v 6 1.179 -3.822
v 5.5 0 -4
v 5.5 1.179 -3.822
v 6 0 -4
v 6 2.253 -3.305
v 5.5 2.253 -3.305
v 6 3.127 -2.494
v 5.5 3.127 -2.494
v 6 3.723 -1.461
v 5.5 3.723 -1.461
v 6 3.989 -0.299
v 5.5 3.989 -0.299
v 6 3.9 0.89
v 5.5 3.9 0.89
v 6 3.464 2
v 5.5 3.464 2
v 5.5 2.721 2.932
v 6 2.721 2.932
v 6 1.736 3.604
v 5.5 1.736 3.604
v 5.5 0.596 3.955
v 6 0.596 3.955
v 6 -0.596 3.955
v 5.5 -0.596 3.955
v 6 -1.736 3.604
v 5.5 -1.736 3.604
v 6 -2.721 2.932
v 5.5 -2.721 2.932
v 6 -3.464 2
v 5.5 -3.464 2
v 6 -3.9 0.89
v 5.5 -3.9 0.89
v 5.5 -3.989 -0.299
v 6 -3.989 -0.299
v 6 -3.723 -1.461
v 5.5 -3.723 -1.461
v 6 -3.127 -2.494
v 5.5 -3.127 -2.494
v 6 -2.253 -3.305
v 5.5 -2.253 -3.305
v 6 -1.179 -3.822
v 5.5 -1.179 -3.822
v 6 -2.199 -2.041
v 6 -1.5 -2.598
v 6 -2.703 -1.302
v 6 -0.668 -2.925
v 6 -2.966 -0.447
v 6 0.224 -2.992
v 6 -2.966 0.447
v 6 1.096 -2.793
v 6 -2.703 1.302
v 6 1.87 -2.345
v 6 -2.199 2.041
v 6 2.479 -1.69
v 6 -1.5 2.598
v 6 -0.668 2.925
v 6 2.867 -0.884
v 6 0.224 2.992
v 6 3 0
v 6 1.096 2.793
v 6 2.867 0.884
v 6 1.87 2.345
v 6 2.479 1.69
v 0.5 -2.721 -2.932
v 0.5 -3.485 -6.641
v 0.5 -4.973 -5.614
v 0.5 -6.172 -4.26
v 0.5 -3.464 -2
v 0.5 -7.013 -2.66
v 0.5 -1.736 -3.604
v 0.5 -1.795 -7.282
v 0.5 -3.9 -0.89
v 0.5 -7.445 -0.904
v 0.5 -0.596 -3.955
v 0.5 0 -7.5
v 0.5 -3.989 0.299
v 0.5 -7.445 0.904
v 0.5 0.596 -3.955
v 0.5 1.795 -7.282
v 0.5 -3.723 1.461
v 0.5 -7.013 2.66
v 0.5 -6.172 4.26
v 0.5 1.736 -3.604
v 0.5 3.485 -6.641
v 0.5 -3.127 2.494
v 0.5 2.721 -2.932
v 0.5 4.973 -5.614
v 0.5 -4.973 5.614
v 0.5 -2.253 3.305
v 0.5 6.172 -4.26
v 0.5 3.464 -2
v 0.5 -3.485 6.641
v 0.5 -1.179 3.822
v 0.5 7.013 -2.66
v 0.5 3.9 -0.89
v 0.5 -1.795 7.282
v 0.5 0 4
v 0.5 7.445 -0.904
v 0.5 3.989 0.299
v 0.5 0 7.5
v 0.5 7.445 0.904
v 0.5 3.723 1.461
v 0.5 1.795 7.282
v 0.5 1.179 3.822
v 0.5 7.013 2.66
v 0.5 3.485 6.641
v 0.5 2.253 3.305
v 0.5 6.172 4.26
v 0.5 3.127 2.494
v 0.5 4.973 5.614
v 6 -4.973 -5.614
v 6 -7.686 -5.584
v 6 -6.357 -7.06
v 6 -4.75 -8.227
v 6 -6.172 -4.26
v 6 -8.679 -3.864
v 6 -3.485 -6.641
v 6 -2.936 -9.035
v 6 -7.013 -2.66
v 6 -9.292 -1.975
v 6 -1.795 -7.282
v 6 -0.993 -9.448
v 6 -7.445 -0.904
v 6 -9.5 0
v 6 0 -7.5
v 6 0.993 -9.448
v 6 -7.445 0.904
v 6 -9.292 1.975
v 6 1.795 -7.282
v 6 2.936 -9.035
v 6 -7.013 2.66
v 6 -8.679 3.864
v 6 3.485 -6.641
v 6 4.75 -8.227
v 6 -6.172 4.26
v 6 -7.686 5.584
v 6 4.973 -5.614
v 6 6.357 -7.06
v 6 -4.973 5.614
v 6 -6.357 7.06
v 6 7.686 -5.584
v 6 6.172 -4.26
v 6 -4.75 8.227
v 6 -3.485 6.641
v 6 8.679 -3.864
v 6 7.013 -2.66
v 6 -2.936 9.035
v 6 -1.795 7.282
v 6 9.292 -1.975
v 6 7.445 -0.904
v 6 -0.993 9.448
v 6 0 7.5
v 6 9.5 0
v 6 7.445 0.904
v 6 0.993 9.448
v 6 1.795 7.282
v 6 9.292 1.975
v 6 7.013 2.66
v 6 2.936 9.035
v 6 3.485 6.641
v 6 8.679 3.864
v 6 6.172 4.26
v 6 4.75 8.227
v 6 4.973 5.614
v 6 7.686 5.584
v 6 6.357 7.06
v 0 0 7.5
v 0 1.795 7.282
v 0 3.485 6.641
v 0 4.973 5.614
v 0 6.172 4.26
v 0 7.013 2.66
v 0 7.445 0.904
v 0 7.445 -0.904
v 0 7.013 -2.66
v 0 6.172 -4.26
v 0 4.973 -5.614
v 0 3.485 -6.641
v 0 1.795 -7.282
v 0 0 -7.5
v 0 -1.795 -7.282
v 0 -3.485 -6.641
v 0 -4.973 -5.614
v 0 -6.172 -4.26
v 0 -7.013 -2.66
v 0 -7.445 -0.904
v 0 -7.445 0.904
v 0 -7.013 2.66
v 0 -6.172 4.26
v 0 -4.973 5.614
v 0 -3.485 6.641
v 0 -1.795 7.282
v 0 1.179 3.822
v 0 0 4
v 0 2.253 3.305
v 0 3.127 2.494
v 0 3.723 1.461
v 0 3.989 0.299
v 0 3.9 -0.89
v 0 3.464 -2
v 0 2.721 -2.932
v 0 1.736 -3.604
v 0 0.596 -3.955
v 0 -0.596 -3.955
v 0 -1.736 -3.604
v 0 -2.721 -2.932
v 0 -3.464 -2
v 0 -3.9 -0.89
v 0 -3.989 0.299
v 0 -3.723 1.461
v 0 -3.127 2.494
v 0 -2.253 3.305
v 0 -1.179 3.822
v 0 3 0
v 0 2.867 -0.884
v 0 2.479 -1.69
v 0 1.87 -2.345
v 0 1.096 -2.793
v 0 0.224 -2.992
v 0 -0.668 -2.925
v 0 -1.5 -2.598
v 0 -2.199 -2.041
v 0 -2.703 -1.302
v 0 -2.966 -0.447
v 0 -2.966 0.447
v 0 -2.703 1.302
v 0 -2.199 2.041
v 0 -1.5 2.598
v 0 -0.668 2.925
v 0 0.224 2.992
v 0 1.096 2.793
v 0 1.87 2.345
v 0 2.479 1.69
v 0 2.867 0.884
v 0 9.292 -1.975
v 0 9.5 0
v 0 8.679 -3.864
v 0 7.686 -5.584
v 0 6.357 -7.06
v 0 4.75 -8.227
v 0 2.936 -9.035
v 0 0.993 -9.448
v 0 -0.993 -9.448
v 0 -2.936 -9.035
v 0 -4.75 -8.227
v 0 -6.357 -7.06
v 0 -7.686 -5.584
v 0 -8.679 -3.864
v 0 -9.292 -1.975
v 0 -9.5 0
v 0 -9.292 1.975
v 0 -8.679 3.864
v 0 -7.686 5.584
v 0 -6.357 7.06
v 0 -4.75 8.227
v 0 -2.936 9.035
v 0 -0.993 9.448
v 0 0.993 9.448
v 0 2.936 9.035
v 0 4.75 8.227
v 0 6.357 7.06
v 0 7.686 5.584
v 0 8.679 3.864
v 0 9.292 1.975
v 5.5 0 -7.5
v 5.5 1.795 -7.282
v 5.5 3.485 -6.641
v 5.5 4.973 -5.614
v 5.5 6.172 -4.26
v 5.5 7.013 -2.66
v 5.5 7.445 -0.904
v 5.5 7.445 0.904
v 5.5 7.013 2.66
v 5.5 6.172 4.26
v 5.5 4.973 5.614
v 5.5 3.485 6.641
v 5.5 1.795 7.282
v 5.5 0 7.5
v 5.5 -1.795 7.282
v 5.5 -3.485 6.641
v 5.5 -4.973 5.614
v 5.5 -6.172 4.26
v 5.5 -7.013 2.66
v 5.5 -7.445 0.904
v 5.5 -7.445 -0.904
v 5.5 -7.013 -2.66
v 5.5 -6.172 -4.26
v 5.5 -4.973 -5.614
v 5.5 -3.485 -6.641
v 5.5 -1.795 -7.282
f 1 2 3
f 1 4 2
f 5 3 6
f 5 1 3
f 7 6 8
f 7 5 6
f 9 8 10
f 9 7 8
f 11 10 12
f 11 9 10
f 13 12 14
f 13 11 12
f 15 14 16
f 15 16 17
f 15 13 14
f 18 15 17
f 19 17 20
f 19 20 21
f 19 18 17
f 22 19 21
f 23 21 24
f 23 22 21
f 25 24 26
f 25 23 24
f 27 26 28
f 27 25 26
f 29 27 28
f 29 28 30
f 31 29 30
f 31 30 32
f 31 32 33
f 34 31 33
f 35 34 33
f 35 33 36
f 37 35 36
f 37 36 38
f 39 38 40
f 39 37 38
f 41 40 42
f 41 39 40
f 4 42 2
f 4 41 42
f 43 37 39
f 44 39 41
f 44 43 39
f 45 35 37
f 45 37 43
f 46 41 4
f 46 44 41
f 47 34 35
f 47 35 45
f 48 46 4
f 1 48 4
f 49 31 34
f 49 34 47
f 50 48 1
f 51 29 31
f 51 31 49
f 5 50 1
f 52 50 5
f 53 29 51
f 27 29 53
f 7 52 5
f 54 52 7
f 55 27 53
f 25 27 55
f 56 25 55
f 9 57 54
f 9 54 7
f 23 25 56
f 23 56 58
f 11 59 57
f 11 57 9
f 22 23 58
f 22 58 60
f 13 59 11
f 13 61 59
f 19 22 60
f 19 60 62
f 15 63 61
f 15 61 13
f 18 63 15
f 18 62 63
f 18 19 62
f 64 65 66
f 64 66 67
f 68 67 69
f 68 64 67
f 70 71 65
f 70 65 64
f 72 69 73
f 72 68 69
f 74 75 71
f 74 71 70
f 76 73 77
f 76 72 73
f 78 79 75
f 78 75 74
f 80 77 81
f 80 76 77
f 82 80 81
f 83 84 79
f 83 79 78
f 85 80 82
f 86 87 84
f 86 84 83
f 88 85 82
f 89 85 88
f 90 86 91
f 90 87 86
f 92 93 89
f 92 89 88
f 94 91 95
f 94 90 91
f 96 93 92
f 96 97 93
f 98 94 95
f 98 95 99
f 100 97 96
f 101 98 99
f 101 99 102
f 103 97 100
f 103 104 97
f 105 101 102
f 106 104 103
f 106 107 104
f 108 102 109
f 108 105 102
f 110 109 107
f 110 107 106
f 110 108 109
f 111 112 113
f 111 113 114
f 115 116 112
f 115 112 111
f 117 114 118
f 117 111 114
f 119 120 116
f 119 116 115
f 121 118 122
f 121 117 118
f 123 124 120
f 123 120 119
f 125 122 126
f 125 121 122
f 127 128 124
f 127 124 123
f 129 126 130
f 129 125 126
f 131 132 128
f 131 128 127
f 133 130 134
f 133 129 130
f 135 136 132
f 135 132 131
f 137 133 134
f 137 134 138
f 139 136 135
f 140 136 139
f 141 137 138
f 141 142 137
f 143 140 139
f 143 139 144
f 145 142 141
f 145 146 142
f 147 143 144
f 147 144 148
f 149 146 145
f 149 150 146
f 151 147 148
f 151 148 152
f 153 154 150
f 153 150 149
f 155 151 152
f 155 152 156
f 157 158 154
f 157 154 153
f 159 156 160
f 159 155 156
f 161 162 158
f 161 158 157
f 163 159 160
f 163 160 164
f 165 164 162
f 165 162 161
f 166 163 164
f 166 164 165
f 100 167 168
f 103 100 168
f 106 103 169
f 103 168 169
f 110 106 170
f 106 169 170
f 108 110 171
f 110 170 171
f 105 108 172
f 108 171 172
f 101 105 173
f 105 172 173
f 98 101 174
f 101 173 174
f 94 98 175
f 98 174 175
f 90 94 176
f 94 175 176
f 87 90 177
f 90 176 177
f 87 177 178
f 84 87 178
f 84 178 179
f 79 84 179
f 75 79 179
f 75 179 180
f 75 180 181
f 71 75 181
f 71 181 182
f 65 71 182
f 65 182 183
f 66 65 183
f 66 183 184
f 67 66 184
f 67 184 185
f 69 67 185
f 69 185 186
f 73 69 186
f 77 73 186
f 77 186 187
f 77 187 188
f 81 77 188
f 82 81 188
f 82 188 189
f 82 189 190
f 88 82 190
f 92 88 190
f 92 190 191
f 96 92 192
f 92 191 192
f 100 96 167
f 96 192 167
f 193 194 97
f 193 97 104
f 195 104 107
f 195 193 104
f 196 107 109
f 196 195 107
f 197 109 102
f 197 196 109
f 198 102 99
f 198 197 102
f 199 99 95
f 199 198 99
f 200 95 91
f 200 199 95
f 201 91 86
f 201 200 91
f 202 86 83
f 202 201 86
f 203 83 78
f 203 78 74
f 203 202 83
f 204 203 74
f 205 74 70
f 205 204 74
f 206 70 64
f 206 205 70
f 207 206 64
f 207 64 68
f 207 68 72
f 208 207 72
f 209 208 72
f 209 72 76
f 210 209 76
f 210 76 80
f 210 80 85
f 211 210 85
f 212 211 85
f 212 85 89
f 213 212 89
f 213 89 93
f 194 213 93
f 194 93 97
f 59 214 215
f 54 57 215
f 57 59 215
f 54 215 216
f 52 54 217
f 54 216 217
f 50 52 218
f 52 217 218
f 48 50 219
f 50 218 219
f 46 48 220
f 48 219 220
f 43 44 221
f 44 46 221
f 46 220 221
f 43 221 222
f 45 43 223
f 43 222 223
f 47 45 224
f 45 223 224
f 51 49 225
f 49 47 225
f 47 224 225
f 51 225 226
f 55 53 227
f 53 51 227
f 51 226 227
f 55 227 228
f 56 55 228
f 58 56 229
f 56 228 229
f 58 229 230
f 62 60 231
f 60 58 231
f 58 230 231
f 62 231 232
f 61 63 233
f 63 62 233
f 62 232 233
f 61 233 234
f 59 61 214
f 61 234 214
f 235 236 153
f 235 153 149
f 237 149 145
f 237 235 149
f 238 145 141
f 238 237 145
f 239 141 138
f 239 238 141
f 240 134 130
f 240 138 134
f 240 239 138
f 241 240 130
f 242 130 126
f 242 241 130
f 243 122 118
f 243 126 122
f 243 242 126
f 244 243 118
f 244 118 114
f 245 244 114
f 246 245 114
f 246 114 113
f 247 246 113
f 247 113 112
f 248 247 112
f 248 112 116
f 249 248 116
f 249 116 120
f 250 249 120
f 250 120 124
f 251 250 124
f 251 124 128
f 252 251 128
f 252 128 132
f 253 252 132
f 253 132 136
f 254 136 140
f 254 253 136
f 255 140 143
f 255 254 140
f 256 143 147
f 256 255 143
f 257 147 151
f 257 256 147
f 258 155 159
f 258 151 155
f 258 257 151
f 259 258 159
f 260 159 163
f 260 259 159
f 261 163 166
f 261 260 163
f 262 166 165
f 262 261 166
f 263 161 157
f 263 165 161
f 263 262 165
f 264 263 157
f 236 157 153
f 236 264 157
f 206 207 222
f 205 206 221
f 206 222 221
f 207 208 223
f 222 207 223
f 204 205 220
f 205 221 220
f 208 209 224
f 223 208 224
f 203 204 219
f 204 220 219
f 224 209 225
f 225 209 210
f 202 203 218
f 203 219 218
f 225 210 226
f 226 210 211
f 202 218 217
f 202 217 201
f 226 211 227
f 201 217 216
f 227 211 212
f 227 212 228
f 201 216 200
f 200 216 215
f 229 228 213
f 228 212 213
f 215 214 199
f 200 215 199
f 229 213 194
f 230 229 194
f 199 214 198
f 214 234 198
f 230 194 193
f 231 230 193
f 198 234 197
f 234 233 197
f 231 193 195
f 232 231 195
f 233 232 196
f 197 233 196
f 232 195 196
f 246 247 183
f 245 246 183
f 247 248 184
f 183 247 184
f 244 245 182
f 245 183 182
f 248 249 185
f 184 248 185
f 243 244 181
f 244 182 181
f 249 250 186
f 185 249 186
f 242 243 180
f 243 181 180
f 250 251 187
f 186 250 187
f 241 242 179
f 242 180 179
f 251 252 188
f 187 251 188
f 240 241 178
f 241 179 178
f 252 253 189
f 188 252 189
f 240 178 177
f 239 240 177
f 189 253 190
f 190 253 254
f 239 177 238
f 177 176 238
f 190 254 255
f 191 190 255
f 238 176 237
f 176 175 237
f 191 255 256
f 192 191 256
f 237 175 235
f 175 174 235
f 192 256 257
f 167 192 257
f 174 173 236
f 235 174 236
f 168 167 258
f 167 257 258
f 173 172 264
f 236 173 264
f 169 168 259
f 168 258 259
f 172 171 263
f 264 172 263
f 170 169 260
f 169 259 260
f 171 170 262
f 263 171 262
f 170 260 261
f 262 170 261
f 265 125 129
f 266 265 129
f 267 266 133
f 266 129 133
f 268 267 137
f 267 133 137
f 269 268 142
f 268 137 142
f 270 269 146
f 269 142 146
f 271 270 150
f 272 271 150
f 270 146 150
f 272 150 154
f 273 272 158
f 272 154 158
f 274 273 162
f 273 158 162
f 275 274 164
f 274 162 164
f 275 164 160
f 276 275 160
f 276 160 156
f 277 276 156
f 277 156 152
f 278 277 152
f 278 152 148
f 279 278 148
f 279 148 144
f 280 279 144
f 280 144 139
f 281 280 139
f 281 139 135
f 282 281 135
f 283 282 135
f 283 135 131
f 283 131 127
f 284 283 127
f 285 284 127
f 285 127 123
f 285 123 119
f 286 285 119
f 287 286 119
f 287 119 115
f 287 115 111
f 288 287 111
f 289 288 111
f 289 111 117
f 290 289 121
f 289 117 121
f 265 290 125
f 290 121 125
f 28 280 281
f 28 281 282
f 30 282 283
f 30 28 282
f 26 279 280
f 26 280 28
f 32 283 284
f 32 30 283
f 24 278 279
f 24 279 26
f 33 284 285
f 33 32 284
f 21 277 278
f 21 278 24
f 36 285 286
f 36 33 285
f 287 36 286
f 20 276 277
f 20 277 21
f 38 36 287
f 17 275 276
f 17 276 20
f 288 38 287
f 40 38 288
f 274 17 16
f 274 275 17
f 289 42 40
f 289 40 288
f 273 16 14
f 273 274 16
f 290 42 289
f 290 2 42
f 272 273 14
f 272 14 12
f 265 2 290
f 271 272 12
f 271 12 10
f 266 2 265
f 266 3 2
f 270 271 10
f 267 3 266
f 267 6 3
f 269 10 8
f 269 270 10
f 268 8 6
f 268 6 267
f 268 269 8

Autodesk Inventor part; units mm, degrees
ref_plane "YZ Plane" through (0, 0, 0) normal (1, 0, 0) x (0, 1, 0)
ref_plane "XZ Plane" through (0, 0, 0) normal (0, 1, 0) x (-1, 0, 0)
ref_plane "XY Plane" through (0, 0, 0) normal (0, 0, 1) x (1, 0, 0)
sketch "スケッチ1" plane through (0, 0, 0) normal (1, 0, 0) x (0, 1, 0)
  circle A0 centre (0, 0) radius 3
  circle A1 centre (0, 0) radius 9.5
  dimension "d0" = 6
  dimension "d1" = 19
extrude "押し出し1" add sketch "スケッチ1" along normal blind 6
sketch "スケッチ2" plane through (6, 0, 0) normal (1, 0, 0) x (0, 0, -1)
  circle A0 centre (0, 0) radius 4
  circle A1 centre (0, 0) radius 7.5
  dimension "d4" = 8
  dimension "d5" = 15
extrude "押し出し2" cut sketch "スケッチ2" against normal blind 0.5
sketch "スケッチ3" plane through (0, 0, 0) normal (-1, 0, 0) x (0, 0, 1)
  circle A0 centre (0, 0) radius 4
  circle A1 centre (0, 0) radius 7.5
  dimension "d8" = 8
  dimension "d9" = 15
extrude "押し出し3" cut sketch "スケッチ3" against normal blind 0.5
properties part number "Bearing_626ZZ" material "ステンレス鋼"
